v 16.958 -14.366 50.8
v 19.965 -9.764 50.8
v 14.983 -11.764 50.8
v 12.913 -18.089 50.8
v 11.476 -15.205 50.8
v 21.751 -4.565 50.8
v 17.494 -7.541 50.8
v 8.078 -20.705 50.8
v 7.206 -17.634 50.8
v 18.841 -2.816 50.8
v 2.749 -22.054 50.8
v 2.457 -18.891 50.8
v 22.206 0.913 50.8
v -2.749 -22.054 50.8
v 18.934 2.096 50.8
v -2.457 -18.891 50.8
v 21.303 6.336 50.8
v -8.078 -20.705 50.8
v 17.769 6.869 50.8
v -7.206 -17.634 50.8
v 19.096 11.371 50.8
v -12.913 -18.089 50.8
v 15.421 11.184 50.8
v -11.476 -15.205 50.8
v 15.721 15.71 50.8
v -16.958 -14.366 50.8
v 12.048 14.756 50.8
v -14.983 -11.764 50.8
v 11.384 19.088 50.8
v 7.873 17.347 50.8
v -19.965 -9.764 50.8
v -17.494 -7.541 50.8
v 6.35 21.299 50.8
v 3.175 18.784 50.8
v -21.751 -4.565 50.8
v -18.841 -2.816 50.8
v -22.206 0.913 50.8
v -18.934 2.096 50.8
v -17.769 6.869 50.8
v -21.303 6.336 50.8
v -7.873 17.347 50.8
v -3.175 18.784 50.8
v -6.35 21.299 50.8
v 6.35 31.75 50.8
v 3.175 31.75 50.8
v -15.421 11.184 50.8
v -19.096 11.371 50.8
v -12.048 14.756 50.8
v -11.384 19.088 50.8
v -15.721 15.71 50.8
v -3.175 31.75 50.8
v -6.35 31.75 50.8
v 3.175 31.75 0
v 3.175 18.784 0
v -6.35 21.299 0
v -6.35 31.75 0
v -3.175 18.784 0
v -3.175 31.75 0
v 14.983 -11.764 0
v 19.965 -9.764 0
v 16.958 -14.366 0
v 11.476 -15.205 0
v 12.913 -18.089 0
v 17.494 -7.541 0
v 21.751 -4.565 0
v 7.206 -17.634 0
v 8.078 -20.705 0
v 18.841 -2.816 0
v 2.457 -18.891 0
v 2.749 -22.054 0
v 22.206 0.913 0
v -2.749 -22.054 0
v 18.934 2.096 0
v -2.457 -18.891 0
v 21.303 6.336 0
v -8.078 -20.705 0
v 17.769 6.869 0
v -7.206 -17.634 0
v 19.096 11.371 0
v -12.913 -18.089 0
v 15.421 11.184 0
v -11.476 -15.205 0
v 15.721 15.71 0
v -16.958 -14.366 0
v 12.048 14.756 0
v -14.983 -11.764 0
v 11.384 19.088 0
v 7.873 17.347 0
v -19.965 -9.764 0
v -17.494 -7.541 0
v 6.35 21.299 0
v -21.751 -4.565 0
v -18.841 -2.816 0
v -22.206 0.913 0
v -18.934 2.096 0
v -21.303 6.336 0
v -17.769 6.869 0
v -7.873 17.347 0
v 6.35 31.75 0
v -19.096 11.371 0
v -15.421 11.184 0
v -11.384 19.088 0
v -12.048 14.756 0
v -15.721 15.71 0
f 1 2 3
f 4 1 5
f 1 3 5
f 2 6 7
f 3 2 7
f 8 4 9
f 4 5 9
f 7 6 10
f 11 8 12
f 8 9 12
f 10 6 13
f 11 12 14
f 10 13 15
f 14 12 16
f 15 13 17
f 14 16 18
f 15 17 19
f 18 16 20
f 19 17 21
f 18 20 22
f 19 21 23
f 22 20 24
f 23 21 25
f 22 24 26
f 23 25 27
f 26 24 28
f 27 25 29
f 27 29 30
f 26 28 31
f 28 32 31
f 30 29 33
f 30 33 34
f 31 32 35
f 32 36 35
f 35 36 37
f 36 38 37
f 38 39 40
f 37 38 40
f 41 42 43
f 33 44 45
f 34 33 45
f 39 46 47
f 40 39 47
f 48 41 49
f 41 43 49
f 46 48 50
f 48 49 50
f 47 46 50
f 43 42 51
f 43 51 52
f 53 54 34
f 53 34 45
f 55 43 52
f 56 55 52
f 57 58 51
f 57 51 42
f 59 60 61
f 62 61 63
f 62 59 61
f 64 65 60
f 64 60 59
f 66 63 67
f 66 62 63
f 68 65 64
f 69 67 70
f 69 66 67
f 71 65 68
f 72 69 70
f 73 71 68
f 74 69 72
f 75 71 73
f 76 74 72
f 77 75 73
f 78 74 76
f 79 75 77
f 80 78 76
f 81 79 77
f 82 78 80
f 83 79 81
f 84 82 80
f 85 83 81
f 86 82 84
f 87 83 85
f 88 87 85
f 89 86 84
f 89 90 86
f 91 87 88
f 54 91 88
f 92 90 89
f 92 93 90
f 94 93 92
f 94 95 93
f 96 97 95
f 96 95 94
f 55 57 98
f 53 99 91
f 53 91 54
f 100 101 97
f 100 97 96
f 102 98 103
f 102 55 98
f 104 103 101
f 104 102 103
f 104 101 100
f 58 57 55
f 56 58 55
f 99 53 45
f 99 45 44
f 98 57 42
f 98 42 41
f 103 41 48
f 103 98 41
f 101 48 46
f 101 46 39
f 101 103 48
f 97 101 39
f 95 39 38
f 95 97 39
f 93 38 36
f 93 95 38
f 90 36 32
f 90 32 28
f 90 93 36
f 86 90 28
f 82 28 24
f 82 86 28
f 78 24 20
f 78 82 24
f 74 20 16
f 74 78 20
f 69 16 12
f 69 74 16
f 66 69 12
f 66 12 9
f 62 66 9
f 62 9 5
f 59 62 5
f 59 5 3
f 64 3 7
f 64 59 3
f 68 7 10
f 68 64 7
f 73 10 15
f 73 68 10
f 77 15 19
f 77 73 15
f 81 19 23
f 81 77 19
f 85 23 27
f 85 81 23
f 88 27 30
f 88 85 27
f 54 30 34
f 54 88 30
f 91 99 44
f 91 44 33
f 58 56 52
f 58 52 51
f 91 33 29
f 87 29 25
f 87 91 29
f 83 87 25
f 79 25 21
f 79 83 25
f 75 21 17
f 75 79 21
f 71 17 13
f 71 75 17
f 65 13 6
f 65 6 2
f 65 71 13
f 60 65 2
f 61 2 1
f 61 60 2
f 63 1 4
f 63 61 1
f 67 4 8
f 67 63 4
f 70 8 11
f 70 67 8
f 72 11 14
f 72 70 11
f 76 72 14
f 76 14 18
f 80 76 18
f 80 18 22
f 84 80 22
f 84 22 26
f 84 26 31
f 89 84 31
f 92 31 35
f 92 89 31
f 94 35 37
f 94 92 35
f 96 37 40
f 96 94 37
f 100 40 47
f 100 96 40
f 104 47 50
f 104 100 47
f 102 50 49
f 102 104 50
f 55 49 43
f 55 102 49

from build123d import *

# Parameters (mm, degrees)
BOSS_EXTRUDE1_DEPTH = 50.8


with BuildPart() as part:
    # Sketch2 → Boss-Extrude1 (new body)
    with BuildSketch(Plane.XY):
        with BuildLine():
            Line((3.175, 22.86), (3.175, 31.75))
            Line((3.175, 31.75), (6.35, 31.75))
            Line((6.35, 31.75), (6.35, 21.298547486))
            ThreePointArc((6.35, 21.298547486), (0, -22.225), (-6.35, 21.298547486))
            Line((-6.35, 21.298547486), (-6.35, 31.75))
            Line((-6.35, 31.75), (-3.175, 31.75))
            Line((-3.175, 31.75), (-3.175, 22.86))
            Line((-3.175, 22.86), (-3.175, 18.783553311))
            ThreePointArc((-3.175, 18.783553311), (0, -19.05), (3.175, 18.783553311))
            Line((3.175, 18.783553311), (3.175, 22.86))
        make_face()
    extrude(amount=BOSS_EXTRUDE1_DEPTH)


solid = part.part
